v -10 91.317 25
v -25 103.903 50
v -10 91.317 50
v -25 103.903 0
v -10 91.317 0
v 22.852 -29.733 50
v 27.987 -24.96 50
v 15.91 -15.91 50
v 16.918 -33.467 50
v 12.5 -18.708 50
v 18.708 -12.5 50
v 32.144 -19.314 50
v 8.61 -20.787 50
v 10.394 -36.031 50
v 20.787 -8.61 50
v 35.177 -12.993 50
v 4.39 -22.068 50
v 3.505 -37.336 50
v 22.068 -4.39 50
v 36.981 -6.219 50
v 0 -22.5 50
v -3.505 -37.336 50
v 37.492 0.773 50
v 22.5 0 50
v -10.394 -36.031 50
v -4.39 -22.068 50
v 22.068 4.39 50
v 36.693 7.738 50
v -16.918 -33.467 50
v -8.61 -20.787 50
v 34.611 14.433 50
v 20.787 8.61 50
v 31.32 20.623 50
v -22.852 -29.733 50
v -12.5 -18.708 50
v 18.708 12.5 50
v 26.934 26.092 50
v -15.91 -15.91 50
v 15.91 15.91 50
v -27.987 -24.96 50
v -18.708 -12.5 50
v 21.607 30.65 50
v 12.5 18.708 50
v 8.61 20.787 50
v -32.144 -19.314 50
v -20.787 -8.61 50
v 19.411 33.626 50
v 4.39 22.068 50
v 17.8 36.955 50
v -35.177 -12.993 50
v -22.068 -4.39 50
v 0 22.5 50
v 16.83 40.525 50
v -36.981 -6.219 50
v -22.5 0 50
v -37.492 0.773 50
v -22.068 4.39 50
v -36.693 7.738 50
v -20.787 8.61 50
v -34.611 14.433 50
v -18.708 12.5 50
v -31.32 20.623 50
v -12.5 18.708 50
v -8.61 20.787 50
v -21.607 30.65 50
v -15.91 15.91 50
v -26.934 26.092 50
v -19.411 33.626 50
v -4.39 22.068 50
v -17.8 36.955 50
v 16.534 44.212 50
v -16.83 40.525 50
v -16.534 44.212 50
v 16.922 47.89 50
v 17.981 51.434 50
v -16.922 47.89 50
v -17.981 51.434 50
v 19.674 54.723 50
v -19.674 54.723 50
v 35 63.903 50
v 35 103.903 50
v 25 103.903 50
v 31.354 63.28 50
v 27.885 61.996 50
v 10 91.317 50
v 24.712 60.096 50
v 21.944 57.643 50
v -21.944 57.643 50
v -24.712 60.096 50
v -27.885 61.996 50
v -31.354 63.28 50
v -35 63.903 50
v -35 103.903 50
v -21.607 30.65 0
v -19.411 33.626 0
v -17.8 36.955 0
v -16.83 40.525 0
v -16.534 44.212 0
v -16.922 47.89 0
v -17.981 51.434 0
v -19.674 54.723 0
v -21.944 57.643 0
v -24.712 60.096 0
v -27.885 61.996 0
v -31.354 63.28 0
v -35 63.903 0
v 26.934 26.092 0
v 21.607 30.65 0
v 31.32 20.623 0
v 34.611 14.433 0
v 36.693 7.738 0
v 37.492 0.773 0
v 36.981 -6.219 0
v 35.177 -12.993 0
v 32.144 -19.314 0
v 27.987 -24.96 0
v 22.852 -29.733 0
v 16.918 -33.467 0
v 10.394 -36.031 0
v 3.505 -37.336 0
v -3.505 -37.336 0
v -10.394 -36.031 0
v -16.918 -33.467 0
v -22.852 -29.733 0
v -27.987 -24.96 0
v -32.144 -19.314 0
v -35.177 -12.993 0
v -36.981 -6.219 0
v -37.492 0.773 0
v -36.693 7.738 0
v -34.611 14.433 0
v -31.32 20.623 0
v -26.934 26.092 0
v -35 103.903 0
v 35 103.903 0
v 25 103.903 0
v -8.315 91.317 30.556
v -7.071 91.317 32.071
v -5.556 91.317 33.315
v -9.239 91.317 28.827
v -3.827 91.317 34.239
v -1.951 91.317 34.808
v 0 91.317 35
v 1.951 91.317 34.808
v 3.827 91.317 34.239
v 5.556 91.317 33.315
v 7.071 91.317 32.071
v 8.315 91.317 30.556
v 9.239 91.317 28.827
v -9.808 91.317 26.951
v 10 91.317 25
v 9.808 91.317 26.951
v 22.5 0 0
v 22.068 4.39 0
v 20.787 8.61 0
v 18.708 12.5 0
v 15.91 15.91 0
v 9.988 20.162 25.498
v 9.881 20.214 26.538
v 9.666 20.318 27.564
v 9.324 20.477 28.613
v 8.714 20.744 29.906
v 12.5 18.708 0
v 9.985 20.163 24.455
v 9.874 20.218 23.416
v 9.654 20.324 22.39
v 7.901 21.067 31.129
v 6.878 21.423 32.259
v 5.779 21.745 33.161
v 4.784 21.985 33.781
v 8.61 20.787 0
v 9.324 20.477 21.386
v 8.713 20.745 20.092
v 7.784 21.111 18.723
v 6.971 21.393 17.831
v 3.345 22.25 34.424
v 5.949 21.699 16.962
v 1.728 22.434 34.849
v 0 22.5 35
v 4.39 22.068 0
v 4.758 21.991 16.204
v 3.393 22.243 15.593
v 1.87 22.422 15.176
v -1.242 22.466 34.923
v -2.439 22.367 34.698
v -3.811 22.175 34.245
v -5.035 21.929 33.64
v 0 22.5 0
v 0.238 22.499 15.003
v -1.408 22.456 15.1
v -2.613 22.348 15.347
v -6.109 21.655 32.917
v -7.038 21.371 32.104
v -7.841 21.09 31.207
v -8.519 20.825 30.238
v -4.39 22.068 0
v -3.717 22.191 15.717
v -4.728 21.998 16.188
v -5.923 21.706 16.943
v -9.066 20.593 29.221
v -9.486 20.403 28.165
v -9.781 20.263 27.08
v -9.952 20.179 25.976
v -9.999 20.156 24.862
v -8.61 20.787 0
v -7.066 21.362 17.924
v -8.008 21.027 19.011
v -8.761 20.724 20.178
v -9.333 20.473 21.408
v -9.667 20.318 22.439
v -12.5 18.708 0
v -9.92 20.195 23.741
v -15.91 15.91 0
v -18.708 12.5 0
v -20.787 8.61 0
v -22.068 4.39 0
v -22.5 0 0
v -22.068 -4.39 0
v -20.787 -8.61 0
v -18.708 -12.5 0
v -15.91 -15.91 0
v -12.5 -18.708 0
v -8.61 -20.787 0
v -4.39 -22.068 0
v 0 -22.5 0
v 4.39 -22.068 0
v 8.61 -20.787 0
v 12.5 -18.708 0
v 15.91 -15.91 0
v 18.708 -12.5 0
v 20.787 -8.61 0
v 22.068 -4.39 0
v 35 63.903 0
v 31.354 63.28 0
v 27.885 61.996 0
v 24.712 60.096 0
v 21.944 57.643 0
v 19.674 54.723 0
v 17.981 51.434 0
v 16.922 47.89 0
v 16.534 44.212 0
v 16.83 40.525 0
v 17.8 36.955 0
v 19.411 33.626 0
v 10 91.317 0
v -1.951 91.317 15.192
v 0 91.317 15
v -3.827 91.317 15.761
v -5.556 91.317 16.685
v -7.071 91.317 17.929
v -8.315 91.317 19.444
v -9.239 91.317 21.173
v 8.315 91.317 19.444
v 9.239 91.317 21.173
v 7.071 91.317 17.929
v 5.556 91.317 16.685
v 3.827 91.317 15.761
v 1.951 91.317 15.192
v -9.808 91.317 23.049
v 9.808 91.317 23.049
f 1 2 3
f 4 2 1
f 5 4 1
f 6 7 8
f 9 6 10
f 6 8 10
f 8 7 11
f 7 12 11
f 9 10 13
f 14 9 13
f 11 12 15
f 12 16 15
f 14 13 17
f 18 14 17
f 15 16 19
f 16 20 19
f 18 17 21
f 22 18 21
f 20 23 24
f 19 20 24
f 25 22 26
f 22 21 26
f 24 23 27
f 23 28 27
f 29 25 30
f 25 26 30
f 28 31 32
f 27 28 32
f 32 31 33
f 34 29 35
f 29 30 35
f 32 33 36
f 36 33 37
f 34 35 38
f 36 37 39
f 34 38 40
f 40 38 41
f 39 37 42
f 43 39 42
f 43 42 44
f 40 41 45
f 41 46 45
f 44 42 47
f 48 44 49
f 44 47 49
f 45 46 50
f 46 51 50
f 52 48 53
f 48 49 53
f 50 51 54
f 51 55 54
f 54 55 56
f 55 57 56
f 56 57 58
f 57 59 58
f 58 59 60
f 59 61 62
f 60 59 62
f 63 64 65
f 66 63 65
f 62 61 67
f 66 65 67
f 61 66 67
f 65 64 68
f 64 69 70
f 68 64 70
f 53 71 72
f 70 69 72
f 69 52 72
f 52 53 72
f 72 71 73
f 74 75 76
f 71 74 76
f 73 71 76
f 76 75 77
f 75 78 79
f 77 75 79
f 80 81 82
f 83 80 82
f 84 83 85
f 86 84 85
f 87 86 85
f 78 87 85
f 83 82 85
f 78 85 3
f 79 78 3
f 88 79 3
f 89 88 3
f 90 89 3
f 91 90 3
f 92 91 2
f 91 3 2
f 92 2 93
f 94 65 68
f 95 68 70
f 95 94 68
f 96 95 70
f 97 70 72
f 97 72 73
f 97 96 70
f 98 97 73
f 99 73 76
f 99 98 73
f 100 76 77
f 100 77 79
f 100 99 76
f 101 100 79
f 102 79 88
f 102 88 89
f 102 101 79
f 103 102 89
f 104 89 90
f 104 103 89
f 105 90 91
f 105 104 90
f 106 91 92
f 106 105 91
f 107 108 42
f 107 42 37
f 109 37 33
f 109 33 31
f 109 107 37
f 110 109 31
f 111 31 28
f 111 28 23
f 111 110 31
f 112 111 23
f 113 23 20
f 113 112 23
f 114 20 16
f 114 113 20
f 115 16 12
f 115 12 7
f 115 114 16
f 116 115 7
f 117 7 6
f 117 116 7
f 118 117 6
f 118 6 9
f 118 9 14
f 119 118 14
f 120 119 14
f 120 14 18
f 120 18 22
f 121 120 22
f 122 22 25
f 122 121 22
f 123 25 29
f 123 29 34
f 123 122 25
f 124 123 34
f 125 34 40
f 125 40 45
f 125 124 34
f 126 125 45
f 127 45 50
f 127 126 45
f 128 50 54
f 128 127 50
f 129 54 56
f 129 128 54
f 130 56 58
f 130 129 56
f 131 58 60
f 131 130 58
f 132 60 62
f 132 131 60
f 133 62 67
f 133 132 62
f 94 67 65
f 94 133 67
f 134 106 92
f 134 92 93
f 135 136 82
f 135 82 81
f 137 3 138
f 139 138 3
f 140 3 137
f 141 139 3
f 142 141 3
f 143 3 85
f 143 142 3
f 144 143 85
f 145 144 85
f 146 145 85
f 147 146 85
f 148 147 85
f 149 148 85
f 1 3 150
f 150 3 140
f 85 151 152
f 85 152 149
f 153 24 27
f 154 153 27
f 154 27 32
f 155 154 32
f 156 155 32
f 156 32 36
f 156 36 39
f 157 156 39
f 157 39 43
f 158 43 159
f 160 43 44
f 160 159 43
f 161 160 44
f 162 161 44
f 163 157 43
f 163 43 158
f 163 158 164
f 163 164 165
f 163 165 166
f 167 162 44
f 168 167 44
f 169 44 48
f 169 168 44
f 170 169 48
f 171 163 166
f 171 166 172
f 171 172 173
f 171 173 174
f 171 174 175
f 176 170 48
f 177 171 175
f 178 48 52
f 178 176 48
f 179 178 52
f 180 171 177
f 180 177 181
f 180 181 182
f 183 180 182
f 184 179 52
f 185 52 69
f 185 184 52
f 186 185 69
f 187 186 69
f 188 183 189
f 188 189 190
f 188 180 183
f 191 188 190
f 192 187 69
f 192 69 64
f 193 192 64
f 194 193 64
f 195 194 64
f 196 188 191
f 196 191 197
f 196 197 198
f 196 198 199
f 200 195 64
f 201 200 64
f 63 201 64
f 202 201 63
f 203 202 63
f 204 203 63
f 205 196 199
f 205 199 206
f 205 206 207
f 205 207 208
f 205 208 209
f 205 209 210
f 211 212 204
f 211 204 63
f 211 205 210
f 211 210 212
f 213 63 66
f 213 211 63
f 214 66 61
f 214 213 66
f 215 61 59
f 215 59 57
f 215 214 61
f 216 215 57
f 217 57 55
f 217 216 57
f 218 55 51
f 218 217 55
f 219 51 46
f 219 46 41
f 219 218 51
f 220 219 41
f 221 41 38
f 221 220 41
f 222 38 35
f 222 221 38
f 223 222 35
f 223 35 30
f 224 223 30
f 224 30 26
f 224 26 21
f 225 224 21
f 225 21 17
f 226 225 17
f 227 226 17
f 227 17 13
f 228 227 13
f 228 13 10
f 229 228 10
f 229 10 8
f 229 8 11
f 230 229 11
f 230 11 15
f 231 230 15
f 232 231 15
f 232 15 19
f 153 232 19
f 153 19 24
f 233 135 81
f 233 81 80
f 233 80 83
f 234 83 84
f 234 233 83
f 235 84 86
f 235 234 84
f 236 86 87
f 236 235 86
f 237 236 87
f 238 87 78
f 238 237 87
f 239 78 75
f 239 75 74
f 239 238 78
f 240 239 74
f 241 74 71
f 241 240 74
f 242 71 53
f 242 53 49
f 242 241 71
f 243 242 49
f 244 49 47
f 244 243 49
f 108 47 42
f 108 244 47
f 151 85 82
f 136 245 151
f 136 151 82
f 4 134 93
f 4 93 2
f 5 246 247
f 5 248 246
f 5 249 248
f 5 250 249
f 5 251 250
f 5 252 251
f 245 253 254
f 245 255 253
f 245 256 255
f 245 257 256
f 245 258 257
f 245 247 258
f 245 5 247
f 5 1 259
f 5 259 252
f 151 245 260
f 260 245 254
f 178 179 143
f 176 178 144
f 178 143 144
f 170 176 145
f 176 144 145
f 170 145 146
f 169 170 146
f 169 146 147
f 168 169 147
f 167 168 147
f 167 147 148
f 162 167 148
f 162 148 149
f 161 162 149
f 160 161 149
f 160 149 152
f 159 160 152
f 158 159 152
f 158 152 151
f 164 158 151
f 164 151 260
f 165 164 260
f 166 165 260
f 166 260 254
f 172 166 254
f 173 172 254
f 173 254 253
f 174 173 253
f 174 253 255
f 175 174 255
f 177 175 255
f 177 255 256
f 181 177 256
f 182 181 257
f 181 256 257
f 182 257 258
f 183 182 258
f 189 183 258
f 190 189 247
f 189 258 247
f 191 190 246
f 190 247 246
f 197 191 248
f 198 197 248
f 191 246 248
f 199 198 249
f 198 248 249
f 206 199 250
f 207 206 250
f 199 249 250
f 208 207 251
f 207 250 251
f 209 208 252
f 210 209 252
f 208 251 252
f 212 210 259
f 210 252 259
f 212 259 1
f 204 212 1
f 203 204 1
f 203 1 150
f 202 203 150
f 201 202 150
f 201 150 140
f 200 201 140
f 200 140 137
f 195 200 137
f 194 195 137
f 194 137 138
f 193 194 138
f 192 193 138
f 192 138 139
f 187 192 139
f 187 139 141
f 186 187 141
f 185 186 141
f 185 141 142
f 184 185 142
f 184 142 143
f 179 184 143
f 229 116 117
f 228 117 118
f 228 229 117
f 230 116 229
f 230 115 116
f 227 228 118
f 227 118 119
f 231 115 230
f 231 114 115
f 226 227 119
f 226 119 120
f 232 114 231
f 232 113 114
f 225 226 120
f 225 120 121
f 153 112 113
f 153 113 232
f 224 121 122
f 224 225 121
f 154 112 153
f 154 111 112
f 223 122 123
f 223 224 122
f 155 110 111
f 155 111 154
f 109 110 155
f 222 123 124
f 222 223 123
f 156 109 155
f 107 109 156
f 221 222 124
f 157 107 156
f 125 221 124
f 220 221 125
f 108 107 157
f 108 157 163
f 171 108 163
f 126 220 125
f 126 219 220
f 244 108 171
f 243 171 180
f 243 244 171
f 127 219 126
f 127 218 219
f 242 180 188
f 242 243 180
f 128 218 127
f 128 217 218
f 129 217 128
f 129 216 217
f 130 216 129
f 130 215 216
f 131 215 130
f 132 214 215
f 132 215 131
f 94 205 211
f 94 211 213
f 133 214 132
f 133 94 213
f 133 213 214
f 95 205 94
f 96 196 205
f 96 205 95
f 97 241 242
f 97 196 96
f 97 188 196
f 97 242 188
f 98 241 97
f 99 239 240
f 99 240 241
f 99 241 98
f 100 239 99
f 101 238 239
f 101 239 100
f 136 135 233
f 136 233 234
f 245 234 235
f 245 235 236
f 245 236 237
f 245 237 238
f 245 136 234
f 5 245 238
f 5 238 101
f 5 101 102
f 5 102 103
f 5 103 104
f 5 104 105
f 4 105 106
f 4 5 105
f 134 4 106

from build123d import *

# Parameters (mm, degrees)
SKETCH1_R               = 22.5
BOSS_EXTRUDE1_DEPTH     = 50
CUT_EXTRUDE1_REACH      = 145.178
CUT_EXTRUDE1_END_RADIUS = 22.5
SKETCH3_R               = 10


with BuildPart() as part:
    # Sketch1 → Boss-Extrude1 (new body)
    with BuildSketch(Plane.XY):
        with BuildLine():
            Line((-25, 103.903355596), (-10, 91.316861128))
            Line((-10, 91.316861128), (10, 91.316861128))
            Line((10, 91.316861128), (25, 103.903355596))
            Line((25, 103.903355596), (35, 103.903355596))
            Line((35, 103.903355596), (35, 63.903355596))
            ThreePointArc((35, 63.903355596), (17.980602011, 51.434096177), (21.606705181, 30.649637701))
            ThreePointArc((21.606705181, 30.649637701), (0, -37.5), (-21.606705181, 30.649637701))
            ThreePointArc((-21.606705181, 30.649637701), (-17.980602011, 51.434096177), (-35, 63.903355596))
            Line((-35, 63.903355596), (-35, 103.903355596))
            Line((-35, 103.903355596), (-25, 103.903355596))
        make_face()
        Circle(SKETCH1_R, mode=Mode.SUBTRACT)
    extrude(amount=BOSS_EXTRUDE1_DEPTH)

    # Cut-Extrude1: up to this cylinder (the profile starts outside it)
    cut_extrude1_end = Plane(origin=(0, 0, 25), z_dir=(0, 0, -1)) * Cylinder(CUT_EXTRUDE1_END_RADIUS, 336.356, mode=Mode.PRIVATE)
    # Sketch3 → Cut-Extrude1 (cut, up to the surface)
    with BuildSketch(Plane(origin=(0, 91.316861128, 0), x_dir=(1, 0, 0), z_dir=(0, 1, 0)), mode=Mode.PRIVATE) as cut_extrude1_sk1:
        with Locations(Location((0, -25, 0), (0, 0, 270))):
            Circle(SKETCH3_R)
    cut_extrude1_tool1 = extrude(cut_extrude1_sk1.sketch, amount=-CUT_EXTRUDE1_REACH, mode=Mode.PRIVATE) - cut_extrude1_end
    add(cut_extrude1_tool1.solids().sort_by_distance((0, 91.316861, 25))[0], mode=Mode.SUBTRACT)


solid = part.part
